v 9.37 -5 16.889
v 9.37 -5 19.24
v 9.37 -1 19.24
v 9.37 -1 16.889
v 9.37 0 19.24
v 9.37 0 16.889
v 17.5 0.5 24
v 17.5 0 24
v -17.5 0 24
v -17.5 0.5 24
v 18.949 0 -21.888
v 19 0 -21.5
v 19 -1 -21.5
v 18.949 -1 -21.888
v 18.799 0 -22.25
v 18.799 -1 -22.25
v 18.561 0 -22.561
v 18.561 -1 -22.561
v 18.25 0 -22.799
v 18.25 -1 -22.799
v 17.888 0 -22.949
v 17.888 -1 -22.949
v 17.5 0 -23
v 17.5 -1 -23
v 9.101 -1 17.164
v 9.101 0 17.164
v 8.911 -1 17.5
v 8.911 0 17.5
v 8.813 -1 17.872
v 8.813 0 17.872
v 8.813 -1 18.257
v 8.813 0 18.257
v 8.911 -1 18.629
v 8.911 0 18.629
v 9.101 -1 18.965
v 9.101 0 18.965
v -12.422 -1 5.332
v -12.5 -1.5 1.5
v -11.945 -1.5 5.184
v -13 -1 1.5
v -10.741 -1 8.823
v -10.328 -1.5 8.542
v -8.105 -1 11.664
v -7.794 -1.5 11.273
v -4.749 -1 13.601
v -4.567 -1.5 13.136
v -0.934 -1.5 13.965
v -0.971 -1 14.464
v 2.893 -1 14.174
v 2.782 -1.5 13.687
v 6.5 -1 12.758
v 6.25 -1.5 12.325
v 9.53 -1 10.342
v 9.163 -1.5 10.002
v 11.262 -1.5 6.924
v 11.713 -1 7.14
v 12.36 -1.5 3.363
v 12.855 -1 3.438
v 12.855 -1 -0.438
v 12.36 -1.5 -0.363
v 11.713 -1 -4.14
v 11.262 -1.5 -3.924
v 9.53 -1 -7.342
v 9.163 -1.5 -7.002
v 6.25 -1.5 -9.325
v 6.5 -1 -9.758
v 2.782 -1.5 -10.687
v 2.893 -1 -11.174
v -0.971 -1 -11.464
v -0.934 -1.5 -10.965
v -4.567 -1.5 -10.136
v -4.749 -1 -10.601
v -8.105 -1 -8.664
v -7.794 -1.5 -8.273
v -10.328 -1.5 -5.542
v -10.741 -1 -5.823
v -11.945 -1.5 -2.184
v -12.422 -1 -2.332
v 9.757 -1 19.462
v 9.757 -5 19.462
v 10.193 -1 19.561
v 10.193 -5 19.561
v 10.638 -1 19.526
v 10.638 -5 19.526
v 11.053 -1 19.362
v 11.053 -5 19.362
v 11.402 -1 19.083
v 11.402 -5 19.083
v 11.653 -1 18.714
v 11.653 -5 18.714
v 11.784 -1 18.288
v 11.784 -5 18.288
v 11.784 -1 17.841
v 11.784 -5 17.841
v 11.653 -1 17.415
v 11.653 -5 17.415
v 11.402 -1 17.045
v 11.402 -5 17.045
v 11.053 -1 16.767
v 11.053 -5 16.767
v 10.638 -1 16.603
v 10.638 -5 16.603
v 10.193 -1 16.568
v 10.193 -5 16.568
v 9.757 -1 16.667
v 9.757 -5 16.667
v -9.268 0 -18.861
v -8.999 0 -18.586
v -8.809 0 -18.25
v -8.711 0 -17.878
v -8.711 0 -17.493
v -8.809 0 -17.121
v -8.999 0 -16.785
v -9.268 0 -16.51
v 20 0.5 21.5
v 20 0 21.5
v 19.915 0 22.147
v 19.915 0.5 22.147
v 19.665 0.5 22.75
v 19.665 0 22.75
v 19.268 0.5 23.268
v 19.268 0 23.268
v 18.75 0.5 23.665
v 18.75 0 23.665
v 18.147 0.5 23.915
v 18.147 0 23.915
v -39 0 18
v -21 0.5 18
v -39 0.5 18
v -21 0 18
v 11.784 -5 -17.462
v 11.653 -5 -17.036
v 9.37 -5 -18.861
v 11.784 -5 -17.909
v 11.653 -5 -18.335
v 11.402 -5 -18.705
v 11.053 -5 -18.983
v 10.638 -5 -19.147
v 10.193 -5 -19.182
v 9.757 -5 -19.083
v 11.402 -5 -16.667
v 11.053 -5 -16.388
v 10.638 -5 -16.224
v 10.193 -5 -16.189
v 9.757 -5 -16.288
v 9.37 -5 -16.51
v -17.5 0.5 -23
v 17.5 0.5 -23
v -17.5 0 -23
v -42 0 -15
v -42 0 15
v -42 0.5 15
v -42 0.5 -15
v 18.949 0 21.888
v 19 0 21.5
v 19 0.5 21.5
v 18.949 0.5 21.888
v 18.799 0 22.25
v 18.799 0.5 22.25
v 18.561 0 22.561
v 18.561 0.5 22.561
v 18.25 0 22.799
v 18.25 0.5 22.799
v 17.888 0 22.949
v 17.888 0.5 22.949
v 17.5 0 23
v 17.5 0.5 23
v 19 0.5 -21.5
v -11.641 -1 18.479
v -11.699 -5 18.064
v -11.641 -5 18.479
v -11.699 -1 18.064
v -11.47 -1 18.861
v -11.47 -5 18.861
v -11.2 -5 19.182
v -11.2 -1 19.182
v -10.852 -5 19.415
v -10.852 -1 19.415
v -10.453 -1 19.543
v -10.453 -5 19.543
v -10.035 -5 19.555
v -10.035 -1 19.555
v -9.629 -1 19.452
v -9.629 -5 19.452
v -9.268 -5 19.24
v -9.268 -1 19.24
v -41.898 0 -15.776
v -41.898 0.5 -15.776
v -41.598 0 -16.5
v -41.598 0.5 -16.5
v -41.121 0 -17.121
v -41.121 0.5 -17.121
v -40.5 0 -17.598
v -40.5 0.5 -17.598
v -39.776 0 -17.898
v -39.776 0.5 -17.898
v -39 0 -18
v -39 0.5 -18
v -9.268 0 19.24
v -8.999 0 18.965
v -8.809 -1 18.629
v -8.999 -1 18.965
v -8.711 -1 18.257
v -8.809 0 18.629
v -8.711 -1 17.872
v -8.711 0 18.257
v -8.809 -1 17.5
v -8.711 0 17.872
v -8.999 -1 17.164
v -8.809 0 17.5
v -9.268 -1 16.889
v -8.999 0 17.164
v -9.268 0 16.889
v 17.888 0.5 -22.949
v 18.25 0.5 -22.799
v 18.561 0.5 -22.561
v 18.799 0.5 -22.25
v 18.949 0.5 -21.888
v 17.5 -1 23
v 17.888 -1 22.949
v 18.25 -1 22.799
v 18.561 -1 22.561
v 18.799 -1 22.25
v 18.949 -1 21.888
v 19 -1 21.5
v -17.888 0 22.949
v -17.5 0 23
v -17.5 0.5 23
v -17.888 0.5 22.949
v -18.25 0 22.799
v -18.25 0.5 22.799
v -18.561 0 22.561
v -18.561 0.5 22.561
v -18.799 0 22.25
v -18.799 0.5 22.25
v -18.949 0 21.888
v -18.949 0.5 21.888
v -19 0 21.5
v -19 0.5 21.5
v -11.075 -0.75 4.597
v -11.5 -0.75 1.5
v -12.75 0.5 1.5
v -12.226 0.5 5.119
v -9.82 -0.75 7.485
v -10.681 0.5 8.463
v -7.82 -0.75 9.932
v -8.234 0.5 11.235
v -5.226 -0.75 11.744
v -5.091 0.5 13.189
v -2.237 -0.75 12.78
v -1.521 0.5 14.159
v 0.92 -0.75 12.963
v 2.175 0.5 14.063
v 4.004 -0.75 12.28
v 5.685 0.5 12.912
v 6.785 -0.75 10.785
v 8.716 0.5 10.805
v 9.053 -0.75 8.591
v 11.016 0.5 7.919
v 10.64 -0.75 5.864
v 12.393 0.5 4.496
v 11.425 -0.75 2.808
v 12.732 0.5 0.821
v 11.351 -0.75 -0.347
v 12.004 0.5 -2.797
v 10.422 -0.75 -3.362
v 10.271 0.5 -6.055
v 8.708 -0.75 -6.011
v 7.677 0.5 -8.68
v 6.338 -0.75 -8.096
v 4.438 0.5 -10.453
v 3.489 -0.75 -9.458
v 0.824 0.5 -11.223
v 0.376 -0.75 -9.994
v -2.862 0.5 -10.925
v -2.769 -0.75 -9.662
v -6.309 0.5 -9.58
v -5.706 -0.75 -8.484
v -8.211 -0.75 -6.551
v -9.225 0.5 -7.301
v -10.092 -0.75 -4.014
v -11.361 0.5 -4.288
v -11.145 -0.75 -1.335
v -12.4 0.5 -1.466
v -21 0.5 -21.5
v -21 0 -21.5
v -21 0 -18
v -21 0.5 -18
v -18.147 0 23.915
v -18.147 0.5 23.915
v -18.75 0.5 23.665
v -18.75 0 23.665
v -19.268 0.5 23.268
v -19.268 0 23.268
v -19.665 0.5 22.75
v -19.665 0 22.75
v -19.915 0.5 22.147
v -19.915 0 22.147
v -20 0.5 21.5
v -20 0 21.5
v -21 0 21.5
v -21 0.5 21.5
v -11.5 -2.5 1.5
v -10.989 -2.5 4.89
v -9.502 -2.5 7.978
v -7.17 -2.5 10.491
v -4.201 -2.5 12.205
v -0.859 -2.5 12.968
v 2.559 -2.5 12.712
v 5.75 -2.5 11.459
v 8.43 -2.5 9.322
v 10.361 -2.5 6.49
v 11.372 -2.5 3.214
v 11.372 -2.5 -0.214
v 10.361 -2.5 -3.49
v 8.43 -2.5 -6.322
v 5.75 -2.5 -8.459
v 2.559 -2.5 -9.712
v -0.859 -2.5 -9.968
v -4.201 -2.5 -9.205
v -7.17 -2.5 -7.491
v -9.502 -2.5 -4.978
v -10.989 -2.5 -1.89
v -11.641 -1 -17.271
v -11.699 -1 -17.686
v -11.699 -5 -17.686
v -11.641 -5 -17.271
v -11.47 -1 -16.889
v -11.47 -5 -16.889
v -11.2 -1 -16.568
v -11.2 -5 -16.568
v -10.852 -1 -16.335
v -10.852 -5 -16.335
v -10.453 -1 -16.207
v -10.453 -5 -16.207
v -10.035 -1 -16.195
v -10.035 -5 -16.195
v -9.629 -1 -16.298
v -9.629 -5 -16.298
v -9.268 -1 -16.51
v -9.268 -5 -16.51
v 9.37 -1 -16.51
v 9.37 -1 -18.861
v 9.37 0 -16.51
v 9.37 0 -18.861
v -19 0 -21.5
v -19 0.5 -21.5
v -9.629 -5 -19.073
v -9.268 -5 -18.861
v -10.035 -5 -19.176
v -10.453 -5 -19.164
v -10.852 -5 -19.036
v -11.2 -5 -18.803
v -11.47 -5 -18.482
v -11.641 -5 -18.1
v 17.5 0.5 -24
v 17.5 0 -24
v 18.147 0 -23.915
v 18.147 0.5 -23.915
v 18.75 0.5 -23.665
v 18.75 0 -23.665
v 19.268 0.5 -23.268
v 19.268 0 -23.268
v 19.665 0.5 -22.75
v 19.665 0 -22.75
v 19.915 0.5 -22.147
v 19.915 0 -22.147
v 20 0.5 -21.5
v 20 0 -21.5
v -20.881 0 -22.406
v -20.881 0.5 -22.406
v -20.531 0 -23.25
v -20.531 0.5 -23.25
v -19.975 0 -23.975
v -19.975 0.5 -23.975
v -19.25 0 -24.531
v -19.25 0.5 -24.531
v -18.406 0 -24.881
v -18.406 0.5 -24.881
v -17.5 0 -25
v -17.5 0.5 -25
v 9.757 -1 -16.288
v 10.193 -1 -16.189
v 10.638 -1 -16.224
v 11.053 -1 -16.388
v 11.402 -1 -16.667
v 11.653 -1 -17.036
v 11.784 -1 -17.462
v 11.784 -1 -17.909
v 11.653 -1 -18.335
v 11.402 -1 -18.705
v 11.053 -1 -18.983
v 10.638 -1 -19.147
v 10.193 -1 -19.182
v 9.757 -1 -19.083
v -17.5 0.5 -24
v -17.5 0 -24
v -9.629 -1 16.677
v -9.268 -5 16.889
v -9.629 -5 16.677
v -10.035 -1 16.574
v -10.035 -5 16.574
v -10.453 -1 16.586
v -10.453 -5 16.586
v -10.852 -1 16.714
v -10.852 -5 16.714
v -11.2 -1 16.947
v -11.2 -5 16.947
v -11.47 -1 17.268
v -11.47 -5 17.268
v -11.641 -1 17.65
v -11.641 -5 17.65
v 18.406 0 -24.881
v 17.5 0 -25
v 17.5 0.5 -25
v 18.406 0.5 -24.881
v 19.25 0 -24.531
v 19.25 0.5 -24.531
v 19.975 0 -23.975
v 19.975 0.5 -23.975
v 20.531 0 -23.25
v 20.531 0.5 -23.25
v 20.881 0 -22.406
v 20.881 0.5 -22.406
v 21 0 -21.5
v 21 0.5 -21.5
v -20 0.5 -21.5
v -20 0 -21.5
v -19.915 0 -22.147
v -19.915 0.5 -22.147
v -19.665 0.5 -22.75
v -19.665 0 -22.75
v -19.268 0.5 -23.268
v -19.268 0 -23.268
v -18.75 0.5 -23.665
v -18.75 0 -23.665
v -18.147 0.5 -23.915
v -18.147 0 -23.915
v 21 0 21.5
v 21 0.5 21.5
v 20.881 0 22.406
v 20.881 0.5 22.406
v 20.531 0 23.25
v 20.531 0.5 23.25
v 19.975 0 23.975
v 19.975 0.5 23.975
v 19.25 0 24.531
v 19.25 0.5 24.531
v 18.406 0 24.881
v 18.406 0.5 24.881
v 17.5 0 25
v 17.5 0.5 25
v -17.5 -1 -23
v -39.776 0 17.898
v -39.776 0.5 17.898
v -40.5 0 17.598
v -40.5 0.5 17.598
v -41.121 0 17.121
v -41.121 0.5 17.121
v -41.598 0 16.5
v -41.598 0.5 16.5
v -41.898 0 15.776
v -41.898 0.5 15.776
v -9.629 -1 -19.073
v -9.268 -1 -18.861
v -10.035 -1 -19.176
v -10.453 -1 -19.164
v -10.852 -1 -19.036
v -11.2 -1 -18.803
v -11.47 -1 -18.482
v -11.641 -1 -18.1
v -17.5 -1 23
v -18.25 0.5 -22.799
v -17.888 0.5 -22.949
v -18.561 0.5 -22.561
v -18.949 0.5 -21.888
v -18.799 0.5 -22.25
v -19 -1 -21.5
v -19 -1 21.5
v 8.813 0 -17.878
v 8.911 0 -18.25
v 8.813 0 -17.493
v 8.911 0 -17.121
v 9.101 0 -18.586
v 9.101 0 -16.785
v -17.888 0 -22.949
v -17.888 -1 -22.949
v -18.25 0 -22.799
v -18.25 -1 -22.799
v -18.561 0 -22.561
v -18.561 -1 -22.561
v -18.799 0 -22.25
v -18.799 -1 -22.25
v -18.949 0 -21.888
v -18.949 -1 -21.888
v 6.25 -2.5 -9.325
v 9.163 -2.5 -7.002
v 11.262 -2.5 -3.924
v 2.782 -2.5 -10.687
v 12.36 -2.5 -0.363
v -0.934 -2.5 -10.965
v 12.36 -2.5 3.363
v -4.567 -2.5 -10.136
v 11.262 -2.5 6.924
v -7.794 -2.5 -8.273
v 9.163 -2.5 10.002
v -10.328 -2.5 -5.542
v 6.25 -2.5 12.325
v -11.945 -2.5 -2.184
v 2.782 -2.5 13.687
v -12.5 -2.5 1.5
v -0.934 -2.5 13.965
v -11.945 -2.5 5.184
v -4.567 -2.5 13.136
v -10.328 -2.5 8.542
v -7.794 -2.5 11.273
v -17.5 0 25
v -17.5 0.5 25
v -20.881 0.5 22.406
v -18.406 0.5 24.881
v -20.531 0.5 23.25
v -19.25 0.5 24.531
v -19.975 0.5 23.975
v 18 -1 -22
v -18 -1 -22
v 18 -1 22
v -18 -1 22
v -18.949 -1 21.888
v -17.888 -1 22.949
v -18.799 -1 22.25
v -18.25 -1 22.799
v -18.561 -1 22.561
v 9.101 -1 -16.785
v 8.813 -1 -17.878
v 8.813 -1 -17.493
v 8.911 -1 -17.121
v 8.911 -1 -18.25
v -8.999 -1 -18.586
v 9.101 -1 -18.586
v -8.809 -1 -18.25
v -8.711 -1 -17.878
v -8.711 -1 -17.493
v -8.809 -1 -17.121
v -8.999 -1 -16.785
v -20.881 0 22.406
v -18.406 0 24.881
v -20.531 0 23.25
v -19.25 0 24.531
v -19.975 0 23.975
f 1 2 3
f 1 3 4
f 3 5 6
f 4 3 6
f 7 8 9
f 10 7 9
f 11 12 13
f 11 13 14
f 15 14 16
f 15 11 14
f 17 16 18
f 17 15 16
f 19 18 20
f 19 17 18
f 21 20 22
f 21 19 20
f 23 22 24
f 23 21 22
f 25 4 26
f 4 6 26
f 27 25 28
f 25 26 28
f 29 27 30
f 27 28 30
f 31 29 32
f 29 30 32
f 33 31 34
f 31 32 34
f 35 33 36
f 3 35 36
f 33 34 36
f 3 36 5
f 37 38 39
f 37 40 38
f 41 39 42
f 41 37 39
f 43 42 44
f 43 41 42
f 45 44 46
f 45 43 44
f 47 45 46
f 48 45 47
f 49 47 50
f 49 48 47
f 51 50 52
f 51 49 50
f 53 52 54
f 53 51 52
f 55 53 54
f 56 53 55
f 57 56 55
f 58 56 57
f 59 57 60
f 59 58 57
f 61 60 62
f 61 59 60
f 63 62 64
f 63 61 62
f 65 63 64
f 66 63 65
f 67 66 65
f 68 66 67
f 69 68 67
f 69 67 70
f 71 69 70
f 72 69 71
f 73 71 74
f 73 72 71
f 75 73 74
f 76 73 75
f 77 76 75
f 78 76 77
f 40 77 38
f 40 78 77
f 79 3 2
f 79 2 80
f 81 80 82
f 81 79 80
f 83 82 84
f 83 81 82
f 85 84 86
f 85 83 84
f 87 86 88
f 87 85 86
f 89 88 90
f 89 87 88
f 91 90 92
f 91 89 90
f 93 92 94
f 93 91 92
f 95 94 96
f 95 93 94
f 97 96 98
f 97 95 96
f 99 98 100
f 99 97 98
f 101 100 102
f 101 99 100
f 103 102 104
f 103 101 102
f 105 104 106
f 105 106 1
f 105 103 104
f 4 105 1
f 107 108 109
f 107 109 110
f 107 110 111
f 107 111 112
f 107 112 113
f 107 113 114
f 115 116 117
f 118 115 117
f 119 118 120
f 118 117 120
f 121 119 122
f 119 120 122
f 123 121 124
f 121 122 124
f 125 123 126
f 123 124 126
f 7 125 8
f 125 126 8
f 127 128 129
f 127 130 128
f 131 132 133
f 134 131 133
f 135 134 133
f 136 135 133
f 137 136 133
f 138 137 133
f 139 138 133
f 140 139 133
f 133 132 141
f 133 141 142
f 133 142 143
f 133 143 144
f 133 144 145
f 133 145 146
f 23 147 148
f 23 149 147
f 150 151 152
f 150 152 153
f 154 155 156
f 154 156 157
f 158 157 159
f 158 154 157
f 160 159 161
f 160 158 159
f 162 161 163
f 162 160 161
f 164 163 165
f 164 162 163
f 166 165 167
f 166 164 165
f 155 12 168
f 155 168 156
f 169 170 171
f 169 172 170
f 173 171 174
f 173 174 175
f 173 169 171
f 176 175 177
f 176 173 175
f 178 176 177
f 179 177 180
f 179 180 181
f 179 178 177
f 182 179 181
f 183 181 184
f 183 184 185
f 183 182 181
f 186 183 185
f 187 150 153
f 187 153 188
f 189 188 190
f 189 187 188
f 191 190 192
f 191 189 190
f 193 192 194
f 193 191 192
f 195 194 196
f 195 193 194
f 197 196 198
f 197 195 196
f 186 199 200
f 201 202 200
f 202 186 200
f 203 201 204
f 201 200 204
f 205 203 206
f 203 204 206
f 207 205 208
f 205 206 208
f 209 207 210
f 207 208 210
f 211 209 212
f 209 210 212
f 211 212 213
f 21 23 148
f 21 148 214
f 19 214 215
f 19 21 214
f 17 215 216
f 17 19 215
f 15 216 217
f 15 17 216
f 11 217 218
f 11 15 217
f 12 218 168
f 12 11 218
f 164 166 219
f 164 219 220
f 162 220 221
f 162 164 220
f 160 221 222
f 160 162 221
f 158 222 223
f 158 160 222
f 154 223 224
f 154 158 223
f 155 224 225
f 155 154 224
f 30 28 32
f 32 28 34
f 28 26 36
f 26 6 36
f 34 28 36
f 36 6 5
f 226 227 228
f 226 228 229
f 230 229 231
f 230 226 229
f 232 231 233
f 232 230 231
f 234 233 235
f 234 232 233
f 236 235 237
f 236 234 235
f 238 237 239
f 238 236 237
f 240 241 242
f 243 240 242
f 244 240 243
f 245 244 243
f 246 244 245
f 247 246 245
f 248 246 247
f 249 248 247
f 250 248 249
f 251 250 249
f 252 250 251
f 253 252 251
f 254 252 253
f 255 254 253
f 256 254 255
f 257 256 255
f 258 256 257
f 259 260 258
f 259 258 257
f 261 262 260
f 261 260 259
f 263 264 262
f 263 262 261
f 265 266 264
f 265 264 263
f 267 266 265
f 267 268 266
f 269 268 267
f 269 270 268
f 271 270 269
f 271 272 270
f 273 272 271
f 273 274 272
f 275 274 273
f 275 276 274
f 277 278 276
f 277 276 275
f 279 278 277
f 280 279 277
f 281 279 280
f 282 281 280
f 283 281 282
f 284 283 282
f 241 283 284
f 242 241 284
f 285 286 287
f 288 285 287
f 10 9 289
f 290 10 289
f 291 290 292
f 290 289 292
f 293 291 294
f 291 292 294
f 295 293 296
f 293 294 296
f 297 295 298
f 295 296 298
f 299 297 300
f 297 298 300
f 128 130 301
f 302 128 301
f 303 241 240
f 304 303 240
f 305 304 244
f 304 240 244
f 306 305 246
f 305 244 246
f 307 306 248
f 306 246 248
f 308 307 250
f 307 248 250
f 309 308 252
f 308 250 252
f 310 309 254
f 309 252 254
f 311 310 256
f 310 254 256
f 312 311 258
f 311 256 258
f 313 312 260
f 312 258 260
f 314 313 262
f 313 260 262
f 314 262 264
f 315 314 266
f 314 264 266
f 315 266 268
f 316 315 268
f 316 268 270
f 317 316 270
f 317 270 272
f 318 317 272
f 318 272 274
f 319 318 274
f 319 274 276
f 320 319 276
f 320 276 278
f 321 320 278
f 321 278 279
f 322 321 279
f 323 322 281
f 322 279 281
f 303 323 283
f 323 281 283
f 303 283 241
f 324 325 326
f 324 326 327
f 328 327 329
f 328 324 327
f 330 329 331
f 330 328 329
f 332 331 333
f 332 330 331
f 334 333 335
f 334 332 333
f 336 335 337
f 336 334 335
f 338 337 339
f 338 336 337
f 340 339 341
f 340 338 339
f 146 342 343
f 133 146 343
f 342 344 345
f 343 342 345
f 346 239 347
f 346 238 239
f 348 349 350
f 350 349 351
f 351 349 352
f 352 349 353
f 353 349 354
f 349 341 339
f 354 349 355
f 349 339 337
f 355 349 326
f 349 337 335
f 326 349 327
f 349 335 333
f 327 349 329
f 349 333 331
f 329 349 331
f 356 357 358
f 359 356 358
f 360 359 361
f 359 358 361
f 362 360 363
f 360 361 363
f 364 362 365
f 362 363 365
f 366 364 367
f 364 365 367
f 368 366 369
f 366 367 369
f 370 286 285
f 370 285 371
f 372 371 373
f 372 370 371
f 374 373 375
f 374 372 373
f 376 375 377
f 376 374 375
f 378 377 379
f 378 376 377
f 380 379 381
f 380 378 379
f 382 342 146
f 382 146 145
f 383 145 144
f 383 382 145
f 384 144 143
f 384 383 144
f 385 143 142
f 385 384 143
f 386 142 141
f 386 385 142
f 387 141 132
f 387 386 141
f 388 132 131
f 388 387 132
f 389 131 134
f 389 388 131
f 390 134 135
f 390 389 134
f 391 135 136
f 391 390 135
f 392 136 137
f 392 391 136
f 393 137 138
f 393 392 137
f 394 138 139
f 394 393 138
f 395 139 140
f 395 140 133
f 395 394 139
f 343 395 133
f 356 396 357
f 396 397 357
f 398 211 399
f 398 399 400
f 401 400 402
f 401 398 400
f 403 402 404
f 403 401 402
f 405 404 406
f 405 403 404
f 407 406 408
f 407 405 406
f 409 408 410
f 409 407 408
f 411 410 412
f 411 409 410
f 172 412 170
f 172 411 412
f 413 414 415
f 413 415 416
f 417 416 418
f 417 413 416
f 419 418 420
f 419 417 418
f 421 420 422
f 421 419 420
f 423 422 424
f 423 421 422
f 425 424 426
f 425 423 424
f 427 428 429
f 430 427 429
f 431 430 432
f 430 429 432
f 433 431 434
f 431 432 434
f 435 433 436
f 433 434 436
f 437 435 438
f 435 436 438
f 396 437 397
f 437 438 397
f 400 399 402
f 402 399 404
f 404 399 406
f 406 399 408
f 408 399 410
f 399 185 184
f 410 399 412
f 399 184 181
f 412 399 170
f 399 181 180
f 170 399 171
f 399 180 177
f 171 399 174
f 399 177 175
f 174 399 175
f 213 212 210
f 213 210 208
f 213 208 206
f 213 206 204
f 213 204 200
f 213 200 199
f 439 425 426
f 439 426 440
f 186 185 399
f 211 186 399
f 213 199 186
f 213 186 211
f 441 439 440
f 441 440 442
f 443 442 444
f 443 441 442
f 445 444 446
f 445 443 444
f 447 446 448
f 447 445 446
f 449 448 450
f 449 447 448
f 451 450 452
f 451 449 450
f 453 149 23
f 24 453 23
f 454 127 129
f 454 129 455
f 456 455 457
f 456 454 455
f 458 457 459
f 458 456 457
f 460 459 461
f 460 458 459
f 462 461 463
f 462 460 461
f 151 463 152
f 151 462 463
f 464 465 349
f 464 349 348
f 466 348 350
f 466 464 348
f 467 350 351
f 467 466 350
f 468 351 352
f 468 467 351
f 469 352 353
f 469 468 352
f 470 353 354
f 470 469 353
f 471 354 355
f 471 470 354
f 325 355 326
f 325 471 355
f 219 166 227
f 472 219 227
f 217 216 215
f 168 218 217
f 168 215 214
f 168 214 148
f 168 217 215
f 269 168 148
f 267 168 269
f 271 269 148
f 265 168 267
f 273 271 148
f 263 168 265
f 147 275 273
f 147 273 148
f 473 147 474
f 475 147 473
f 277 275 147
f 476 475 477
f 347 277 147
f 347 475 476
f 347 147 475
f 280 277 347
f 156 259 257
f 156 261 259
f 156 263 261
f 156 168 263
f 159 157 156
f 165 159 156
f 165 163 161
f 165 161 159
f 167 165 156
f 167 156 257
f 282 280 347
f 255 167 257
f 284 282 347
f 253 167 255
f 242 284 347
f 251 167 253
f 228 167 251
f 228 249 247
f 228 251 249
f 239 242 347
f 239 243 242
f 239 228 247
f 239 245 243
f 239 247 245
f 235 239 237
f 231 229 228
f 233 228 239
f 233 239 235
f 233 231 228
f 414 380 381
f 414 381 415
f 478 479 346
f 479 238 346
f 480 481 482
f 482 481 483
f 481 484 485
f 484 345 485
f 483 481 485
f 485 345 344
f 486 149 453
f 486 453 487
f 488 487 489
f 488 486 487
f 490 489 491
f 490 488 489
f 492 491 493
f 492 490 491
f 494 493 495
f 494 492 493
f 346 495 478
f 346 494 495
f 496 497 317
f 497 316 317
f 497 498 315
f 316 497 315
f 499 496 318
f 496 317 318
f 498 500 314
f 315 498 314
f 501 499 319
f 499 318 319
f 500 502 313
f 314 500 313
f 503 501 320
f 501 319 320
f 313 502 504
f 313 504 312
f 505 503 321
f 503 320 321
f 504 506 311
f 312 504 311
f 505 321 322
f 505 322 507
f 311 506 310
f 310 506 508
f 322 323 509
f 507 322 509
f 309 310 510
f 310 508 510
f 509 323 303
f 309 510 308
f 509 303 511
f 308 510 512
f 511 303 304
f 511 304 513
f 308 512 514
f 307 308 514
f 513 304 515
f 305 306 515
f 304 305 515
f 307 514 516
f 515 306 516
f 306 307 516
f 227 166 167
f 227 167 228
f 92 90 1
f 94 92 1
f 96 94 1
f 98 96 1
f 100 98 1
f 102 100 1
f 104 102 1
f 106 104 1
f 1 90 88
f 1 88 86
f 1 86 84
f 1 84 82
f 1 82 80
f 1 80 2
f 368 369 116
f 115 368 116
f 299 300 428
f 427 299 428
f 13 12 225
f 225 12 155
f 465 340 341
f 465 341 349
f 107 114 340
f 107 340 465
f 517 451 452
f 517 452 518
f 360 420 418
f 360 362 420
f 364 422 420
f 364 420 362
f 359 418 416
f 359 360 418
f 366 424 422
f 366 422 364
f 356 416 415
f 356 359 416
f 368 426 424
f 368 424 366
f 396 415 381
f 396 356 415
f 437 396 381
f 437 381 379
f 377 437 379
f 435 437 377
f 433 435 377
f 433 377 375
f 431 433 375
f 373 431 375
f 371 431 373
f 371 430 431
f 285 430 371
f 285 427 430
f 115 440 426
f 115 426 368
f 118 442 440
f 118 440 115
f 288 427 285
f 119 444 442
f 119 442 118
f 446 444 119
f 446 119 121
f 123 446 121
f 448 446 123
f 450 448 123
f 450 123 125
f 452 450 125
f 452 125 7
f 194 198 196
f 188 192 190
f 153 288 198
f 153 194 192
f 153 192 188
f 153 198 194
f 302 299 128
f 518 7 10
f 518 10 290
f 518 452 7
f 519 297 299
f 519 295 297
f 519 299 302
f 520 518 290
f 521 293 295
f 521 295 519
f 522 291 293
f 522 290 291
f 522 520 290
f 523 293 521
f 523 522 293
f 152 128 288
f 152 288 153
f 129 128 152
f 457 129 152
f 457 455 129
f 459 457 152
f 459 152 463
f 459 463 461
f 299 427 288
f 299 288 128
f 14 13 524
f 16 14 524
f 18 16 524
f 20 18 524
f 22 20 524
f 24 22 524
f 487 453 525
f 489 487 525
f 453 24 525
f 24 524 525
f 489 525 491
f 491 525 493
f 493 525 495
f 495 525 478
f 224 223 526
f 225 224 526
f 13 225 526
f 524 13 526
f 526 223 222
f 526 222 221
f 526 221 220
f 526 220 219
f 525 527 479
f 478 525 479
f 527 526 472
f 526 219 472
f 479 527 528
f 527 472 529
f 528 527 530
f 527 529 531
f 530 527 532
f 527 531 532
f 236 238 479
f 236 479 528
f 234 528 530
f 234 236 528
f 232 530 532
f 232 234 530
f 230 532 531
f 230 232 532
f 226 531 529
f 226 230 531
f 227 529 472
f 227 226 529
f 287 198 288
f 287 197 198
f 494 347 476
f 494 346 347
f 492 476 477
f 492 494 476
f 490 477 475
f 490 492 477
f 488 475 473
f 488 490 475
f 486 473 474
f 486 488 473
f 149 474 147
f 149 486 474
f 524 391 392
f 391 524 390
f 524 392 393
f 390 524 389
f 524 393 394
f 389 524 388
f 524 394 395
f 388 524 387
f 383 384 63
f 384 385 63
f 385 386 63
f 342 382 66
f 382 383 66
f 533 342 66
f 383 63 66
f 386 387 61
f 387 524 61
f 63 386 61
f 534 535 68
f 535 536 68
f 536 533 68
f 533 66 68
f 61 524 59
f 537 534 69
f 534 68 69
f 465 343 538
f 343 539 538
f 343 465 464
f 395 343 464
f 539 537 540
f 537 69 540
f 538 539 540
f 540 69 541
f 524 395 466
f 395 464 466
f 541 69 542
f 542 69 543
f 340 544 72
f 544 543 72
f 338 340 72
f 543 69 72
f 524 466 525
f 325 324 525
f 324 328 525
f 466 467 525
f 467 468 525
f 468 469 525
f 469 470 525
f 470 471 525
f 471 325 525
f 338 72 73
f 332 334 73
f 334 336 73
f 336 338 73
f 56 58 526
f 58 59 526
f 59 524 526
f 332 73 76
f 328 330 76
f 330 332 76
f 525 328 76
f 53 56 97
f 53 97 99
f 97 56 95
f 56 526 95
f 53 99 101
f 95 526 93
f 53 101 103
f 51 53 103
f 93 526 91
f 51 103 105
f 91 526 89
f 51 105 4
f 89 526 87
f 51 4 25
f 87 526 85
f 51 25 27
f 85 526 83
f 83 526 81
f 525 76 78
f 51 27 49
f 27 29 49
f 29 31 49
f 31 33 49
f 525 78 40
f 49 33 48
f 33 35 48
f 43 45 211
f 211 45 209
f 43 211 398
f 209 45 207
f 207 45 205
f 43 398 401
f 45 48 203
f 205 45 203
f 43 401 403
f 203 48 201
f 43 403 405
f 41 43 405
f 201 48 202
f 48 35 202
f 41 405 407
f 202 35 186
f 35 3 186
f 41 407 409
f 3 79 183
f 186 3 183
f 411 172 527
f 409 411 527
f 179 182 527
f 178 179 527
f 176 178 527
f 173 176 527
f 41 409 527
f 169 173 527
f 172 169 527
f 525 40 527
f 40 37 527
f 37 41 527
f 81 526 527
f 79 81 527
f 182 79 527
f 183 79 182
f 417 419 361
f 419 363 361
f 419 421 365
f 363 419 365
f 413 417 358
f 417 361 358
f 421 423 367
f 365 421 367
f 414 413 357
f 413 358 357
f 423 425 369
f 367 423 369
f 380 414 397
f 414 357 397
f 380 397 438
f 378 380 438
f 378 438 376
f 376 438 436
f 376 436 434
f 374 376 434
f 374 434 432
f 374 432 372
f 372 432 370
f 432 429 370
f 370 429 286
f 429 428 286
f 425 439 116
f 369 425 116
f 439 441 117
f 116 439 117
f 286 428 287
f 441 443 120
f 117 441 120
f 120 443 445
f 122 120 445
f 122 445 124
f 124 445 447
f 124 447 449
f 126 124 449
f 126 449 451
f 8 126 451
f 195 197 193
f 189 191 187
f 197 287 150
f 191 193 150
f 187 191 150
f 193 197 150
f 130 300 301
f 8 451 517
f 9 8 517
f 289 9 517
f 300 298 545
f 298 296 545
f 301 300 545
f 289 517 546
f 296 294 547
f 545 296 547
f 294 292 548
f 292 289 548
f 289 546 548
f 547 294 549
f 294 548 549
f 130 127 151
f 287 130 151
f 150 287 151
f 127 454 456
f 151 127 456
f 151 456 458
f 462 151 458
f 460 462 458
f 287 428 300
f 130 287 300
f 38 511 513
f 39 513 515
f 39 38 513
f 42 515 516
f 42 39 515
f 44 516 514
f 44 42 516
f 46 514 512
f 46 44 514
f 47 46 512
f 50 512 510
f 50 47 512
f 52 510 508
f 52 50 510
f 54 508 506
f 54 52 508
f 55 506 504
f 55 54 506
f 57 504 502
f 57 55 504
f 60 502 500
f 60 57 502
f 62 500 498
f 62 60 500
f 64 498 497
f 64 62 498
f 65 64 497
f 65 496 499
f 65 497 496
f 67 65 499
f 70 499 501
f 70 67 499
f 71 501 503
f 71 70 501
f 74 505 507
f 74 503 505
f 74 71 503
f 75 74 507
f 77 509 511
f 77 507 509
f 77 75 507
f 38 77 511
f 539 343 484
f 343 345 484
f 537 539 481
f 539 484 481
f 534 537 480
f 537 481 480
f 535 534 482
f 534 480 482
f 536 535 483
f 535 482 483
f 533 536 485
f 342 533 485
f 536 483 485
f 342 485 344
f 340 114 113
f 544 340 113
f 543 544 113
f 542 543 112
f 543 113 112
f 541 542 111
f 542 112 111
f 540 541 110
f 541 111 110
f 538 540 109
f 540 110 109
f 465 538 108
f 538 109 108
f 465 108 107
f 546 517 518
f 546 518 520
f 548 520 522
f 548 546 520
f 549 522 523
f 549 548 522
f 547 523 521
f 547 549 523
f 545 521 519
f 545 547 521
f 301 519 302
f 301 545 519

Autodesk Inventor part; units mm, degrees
ref_plane "YZ Plane" through (0, 0, 0) normal (1, 0, 0) x (0, 1, 0)
ref_plane "XZ Plane" through (0, 0, 0) normal (0, 1, 0) x (-1, 0, 0)
ref_plane "XY Plane" through (0, 0, 0) normal (0, 0, 1) x (1, 0, 0)
sketch "Sketch1" plane through (0, 0, 0) normal (0, 1, 0) x (-1, 0, 0)
  circle A0 centre (0, 1.5) radius 11.5
  circle A1 centre (0, 1.5) radius 12.5
  line L0 (19.0144, -21.3297) -> (-18.8688, -21.3297) construction
  line L1 (-18.8688, -21.3297) -> (-18.8688, 21.6448) construction
  line L2 (-18.8688, 21.6448) -> (19.0144, 21.6448) construction
  line L3 (19.0144, 21.6448) -> (19.0144, -21.3297) construction
  line L4 (-2.25, -4) -> (-2.25, -8.7)
  line L5 (-2.25, -8.7) -> (2.25, -8.7)
  line L6 (2.25, -8.7) -> (2.25, -4)
  line L7 (2.25, -4) -> (-2.25, -4)
  line L8 (5.9381, 2.2148) -> (9.8353, 4.4648)
  line L9 (9.8353, 4.4648) -> (7.4853, 8.5352)
  line L10 (7.4853, 8.5352) -> (3.5881, 6.2852)
  line L11 (5.9381, 2.2148) -> (3.5881, 6.2852)
  line L12 (-3.5881, 6.2852) -> (-7.4853, 8.5352)
  line L13 (-7.4853, 8.5352) -> (-9.8353, 4.4648)
  line L14 (-9.8353, 4.4648) -> (-5.9381, 2.2148)
  line L15 (-3.5881, 6.2852) -> (-5.9381, 2.2148)
  circle A2 centre (10.199, -17.6855) radius 1.5
  circle A3 centre (-10.301, 18.0645) radius 1.5
  circle A4 centre (10.199, 18.0645) radius 1.5
  circle A5 centre (-10.301, -17.6855) radius 1.5
  line L16 (10.199, -17.6855) -> (-10.301, -17.6855)
  line L17 (-10.301, -17.6855) -> (-10.301, 18.0645)
  line L18 (-10.301, 18.0645) -> (10.199, 18.0645)
  line L19 (10.199, 18.0645) -> (10.199, -17.6855)
  line L20 (18, -22) -> (-18, -22)
  line L21 (-18, -22) -> (-18, 22)
  line L22 (-18, 22) -> (18, 22)
  line L23 (18, 22) -> (18, -22)
  line L24 (18, -22) -> (-18, 22) construction
  line L25 (-18, -22) -> (18, 22) construction
  line L26 (0, 0) -> (20.5, 0)
  line L27 (0, 0) -> (0, 25)
  line L28 (17.5, -25) -> (-17.5, -25)
  line L29 (-21, -21.5) -> (-21, 21.5)
  line L30 (-17.5, 25) -> (17.5, 25)
  line L31 (21, -25) -> (-21, 25) construction
  line L32 (-21, -25) -> (21, 25) construction
  arc A6 (-17.5, 25) -> (-21, 21.5) centre (-17.5, 21.5) ccw
  arc A7 (-21, -21.5) -> (-17.5, -25) centre (-17.5, -21.5) ccw
  line L33 (17.5, -23) -> (-17.5, -23)
  line L34 (-19, -21.5) -> (-19, 21.5)
  line L35 (-17.5, 23) -> (17.5, 23)
  line L36 (19, 21.5) -> (19, -21.5)
  line L37 (19, -23) -> (-19, 23) construction
  line L38 (-19, -23) -> (19, 23) construction
  arc A8 (-17.5, 23) -> (-19, 21.5) centre (-17.5, 21.5) ccw
  arc A9 (-19, -21.5) -> (-17.5, -23) centre (-17.5, -21.5) ccw
  line L39 (9.2678, 19.2405) -> (9.2678, 16.8886)
  line L40 (9.2678, -16.5095) -> (9.2678, -18.8614)
  line L41 (-9.3698, 19.2405) -> (-9.3698, 16.8886)
  line L42 (-9.3698, -16.5095) -> (-9.3698, -18.8614)
  line L43 (17.5, -24) -> (-17.5, -24)
  line L44 (-20, -21.5) -> (-20, 21.5)
  line L45 (-17.5, 24) -> (17.5, 24)
  line L46 (20, -24) -> (-20, 24) construction
  line L47 (-20, -24) -> (20, 24) construction
  arc A10 (-17.5, 24) -> (-20, 21.5) centre (-17.5, 21.5) ccw
  arc A11 (-20, -21.5) -> (-17.5, -24) centre (-17.5, -21.5) ccw
  line L48 (21, -21.5) -> (21, 21.5)
  line L49 (20, 21.5) -> (20, -21.5)
  arc A12 (17.5, -24) -> (20, -21.5) centre (17.5, -21.5) ccw
  arc A13 (17.5, -25) -> (21, -21.5) centre (17.5, -21.5) ccw
  arc A14 (17.5, -23) -> (19, -21.5) centre (17.5, -21.5) ccw
  arc A15 (21, 21.5) -> (17.5, 25) centre (17.5, 21.5) ccw
  arc A16 (20, 21.5) -> (17.5, 24) centre (17.5, 21.5) ccw
  arc A17 (19, 21.5) -> (17.5, 23) centre (17.5, 21.5) ccw
  line L50 (19, 0) -> (39, 0)
  line L51 (39, 0) -> (39, -15)
  line L52 (39, -15) -> (19, -15)
  line L53 (19, -15) -> (19, 15)
  line L54 (19, 15) -> (39, 15)
  line L55 (39, 15) -> (39, -15)
  line L56 (39, 16) -> (19, 16)
  line L57 (19, 16) -> (19, -16)
  line L58 (39, 0) -> (42, 0)
  line L59 (39, 0) -> (40, 0)
  line L60 (40, 0) -> (40, -16)
  line L61 (39, -16) -> (19, -16)
  line L62 (19, -16) -> (19, 16)
  line L63 (40, 15) -> (40, -15)
  line L64 (40, 0) -> (41, 0)
  line L65 (41, 0) -> (41, -17)
  line L66 (39, -17) -> (20, -17)
  line L67 (20, -17) -> (20, 17)
  line L68 (20, 17) -> (39, 17)
  line L69 (41, 15) -> (41, -15)
  line L70 (41, 0) -> (42, 0)
  line L71 (42, 0) -> (42, -15)
  line L72 (39, -18) -> (21, -18)
  line L73 (21, -18) -> (21, 18)
  line L74 (21, 18) -> (39, 18)
  line L75 (42, 15) -> (42, -18)
  arc A18 (39, -16) -> (40, -15) centre (39, -15) ccw
  arc A19 (40, 15) -> (39, 16) centre (39, 15) ccw
  arc A20 (39, -17) -> (41, -15) centre (39, -15) ccw
  arc A21 (41, 15) -> (39, 17) centre (39, 15) ccw
  arc A22 (39, -18) -> (42, -15) centre (39, -15) ccw
  arc A23 (42, 15) -> (39, 18) centre (39, 15) ccw
  line L76 (19, -15) -> (21.5, -15)
  line L77 (21.5, -15) -> (21.5, 16)
  line L78 (21.5, 16) -> (19, 16)
  line L79 (19, 16) -> (19, -15)
  point P0 (21, -22)
  point P1 (21, 22)
  point P2 (19, 24)
  point P3 (19, -24)
  point P4 (40, 16)
  point P5 (42, 18)
  dimension "d33" = 4.7
  dimension "d34" = 4.5
  dimension "d36" = 4.5
  dimension "d37" = 4.7
  dimension "d38" = 3
  dimension "d46" = 3
  dimension "d47" = 3
  dimension "d48" = 3
  dimension "d159" = 36
  dimension "d165" = 42
  dimension "d166" = 50
  dimension "d192" = 40
  dimension "d193" = 48
  dimension "d210" = 46
  dimension "d211" = 1.5
  dimension "d212" = 2.5
  dimension "d214" = 2.5
  dimension "d215" = 3.5
  dimension "d216" = 3.5
  dimension "d217" = 44
  dimension "d244" = 1.5
  dimension "d245" = 2.5
  dimension "d246" = 3.5
  dimension "d247" = 1.5
  dimension "d248" = 3.5
  dimension "d249" = 2.5
  dimension "d250" = 1.5
  dimension "d251" = 38
  dimension "d261" = 20
  dimension "d262" = 15
  dimension "d264" = 30
  dimension "d304" = 1
  dimension "d305" = 16
  dimension "d306" = 21
  dimension "d307" = 1
  dimension "d308" = 17
  dimension "d310" = 34
  dimension "d311" = 1
  dimension "d312" = 18
  dimension "d313" = 21
  dimension "d314" = 36
  dimension "d315" = 1
  dimension "d316" = 2
  dimension "d317" = 3
  dimension "d318" = 2.5
extrude "Extrusion1" add sketch "Sketch1" against normal blind 2.5 contours A0 L19 A1 L26 | A0 L27 A1 L19 | L26 A1 L19 A0 | A0 L17 A1 L27 | L19 A1 L17 A0 | A0 L17 A1
extrude "Extrusion4" add sketch "Sketch1" against normal blind 5 contours L19 L18 L39 A4 | A4 L39 L18 L19 | A4 L18 L39 | L19 L16 L40 A2 | A2 L40 L16 L19 | L17 L18 L41 A3 | A3 L41 L18 L17 | L18 L41 A3 | A3 L41 L18 | A4 L39 L18 | L17 L16 L42 A5 | A5 L42 L16 L17 | L40 L16 A2 | A5 L16 L42 | L42 L16 A5 | A2 L16 L40
extrude "Extrusion11" add sketch "Sketch1" against normal blind 1 contours L19 A4 L18 L27 L22 L23 L26 A1 | A1 L27 L18 A4 L19 | L26 L23 L20 L21 L22 L27 L18 A3 L17 A1 A5 L16 A2 L19 | A1 L17 A3 L18 L27 | L19 A2 L16 A5 L17 A1
extrude "Extrusion13" add sketch "Sketch1" along normal blind 0.5 contours A0 L19 A1 L26 | A0 L27 A1 L19 | L26 A1 L19 A0 | A0 L17 A1 L27 | L19 A4 L18 L27 L22 L23 L26 A1 | A1 L27 L18 A4 L19 | L19 A1 L17 A0 | L26 L23 L20 L21 L22 L27 L18 A3 L17 A1 A5 L16 A2 L19 | A0 L17 A1 | A1 L17 A3 L18 L27 | L19 L18 L39 A4 | A4 L39 L18 L19 | L19 A2 L16 A5 L17 A1 | L26 L36 A14 L33 A9 L34 A8 L35 L27 L22 L21 L20 L23 | L23 L22 L27 L35 A17 L36 L26 | A4 L18 L39 | L19 L16 L40 A2 | A2 L40 L16 L19 | L17 L18 L41 A3 | A3 L41 L18 L17 | L18 L41 A3 | A3 L41 L18 | A4 L39 L18 | L17 L16 L42 A5 | A5 L42 L16 L17 | L40 L16 A2 | A5 L16 L42 | L42 L16 A5 | A2 L16 L40
extrude "Extrusion15" add sketch "Sketch1" against normal blind 1 contours L26 L36 A14 L33 A9 L34 A8 L35 L27 L22 L21 L20 L23 | L23 L22 L27 L35 A17 L36 L26
extrude "Extrusion16" cut sketch "Sketch1" against normal through all contours A4 L18 L39 | L18 L41 A3 | A3 L41 L18 | A4 L39 L18 | L40 L16 A2 | A5 L16 L42 | L42 L16 A5 | A2 L16 L40
chamfer "Chamfer2" distance 1.25 angle 45 1 edges at (11.5, 0.5, 1.5)
chamfer "Chamfer3" distance 0.5 angle 45 1 edges at (12.5, -1, 1.5)
extrude "Extrusion22" add sketch "Sketch1" along normal blind 0.5 contours L49 L54 L48 L50 L26 | L26 L50 L48 L52 L49 | L49 L56 L48 L54 | L52 L48 L61 L49 | L45 A10 L44 A11 L43 A12 L49 L66 L48 A13 L28 A7 L29 A6 L30 L27 | L27 L30 A15 L48 L68 L49 A16 L45 | L50 L77 L52 L48 | L48 L54 L77 L50 | L49 L68 L48 L56 | L48 L56 L77 L54 | L61 L48 L66 L49 | L52 L51 L58 L60 A18 L61 L48 | L77 L54 L55 L50 | L50 L51 L52 L77 | L48 L68 A21 L69 L58 L63 A19 L56 | L77 L56 A19 L63 L58 L55 L54 | L61 A18 L60 L58 L65 A20 L66 L48 | L48 L74 A23 L75 L58 L69 A21 L68 | L66 A20 L65 L58 L71 A22 L72 L48
properties part number "Spectral_Case_2"
